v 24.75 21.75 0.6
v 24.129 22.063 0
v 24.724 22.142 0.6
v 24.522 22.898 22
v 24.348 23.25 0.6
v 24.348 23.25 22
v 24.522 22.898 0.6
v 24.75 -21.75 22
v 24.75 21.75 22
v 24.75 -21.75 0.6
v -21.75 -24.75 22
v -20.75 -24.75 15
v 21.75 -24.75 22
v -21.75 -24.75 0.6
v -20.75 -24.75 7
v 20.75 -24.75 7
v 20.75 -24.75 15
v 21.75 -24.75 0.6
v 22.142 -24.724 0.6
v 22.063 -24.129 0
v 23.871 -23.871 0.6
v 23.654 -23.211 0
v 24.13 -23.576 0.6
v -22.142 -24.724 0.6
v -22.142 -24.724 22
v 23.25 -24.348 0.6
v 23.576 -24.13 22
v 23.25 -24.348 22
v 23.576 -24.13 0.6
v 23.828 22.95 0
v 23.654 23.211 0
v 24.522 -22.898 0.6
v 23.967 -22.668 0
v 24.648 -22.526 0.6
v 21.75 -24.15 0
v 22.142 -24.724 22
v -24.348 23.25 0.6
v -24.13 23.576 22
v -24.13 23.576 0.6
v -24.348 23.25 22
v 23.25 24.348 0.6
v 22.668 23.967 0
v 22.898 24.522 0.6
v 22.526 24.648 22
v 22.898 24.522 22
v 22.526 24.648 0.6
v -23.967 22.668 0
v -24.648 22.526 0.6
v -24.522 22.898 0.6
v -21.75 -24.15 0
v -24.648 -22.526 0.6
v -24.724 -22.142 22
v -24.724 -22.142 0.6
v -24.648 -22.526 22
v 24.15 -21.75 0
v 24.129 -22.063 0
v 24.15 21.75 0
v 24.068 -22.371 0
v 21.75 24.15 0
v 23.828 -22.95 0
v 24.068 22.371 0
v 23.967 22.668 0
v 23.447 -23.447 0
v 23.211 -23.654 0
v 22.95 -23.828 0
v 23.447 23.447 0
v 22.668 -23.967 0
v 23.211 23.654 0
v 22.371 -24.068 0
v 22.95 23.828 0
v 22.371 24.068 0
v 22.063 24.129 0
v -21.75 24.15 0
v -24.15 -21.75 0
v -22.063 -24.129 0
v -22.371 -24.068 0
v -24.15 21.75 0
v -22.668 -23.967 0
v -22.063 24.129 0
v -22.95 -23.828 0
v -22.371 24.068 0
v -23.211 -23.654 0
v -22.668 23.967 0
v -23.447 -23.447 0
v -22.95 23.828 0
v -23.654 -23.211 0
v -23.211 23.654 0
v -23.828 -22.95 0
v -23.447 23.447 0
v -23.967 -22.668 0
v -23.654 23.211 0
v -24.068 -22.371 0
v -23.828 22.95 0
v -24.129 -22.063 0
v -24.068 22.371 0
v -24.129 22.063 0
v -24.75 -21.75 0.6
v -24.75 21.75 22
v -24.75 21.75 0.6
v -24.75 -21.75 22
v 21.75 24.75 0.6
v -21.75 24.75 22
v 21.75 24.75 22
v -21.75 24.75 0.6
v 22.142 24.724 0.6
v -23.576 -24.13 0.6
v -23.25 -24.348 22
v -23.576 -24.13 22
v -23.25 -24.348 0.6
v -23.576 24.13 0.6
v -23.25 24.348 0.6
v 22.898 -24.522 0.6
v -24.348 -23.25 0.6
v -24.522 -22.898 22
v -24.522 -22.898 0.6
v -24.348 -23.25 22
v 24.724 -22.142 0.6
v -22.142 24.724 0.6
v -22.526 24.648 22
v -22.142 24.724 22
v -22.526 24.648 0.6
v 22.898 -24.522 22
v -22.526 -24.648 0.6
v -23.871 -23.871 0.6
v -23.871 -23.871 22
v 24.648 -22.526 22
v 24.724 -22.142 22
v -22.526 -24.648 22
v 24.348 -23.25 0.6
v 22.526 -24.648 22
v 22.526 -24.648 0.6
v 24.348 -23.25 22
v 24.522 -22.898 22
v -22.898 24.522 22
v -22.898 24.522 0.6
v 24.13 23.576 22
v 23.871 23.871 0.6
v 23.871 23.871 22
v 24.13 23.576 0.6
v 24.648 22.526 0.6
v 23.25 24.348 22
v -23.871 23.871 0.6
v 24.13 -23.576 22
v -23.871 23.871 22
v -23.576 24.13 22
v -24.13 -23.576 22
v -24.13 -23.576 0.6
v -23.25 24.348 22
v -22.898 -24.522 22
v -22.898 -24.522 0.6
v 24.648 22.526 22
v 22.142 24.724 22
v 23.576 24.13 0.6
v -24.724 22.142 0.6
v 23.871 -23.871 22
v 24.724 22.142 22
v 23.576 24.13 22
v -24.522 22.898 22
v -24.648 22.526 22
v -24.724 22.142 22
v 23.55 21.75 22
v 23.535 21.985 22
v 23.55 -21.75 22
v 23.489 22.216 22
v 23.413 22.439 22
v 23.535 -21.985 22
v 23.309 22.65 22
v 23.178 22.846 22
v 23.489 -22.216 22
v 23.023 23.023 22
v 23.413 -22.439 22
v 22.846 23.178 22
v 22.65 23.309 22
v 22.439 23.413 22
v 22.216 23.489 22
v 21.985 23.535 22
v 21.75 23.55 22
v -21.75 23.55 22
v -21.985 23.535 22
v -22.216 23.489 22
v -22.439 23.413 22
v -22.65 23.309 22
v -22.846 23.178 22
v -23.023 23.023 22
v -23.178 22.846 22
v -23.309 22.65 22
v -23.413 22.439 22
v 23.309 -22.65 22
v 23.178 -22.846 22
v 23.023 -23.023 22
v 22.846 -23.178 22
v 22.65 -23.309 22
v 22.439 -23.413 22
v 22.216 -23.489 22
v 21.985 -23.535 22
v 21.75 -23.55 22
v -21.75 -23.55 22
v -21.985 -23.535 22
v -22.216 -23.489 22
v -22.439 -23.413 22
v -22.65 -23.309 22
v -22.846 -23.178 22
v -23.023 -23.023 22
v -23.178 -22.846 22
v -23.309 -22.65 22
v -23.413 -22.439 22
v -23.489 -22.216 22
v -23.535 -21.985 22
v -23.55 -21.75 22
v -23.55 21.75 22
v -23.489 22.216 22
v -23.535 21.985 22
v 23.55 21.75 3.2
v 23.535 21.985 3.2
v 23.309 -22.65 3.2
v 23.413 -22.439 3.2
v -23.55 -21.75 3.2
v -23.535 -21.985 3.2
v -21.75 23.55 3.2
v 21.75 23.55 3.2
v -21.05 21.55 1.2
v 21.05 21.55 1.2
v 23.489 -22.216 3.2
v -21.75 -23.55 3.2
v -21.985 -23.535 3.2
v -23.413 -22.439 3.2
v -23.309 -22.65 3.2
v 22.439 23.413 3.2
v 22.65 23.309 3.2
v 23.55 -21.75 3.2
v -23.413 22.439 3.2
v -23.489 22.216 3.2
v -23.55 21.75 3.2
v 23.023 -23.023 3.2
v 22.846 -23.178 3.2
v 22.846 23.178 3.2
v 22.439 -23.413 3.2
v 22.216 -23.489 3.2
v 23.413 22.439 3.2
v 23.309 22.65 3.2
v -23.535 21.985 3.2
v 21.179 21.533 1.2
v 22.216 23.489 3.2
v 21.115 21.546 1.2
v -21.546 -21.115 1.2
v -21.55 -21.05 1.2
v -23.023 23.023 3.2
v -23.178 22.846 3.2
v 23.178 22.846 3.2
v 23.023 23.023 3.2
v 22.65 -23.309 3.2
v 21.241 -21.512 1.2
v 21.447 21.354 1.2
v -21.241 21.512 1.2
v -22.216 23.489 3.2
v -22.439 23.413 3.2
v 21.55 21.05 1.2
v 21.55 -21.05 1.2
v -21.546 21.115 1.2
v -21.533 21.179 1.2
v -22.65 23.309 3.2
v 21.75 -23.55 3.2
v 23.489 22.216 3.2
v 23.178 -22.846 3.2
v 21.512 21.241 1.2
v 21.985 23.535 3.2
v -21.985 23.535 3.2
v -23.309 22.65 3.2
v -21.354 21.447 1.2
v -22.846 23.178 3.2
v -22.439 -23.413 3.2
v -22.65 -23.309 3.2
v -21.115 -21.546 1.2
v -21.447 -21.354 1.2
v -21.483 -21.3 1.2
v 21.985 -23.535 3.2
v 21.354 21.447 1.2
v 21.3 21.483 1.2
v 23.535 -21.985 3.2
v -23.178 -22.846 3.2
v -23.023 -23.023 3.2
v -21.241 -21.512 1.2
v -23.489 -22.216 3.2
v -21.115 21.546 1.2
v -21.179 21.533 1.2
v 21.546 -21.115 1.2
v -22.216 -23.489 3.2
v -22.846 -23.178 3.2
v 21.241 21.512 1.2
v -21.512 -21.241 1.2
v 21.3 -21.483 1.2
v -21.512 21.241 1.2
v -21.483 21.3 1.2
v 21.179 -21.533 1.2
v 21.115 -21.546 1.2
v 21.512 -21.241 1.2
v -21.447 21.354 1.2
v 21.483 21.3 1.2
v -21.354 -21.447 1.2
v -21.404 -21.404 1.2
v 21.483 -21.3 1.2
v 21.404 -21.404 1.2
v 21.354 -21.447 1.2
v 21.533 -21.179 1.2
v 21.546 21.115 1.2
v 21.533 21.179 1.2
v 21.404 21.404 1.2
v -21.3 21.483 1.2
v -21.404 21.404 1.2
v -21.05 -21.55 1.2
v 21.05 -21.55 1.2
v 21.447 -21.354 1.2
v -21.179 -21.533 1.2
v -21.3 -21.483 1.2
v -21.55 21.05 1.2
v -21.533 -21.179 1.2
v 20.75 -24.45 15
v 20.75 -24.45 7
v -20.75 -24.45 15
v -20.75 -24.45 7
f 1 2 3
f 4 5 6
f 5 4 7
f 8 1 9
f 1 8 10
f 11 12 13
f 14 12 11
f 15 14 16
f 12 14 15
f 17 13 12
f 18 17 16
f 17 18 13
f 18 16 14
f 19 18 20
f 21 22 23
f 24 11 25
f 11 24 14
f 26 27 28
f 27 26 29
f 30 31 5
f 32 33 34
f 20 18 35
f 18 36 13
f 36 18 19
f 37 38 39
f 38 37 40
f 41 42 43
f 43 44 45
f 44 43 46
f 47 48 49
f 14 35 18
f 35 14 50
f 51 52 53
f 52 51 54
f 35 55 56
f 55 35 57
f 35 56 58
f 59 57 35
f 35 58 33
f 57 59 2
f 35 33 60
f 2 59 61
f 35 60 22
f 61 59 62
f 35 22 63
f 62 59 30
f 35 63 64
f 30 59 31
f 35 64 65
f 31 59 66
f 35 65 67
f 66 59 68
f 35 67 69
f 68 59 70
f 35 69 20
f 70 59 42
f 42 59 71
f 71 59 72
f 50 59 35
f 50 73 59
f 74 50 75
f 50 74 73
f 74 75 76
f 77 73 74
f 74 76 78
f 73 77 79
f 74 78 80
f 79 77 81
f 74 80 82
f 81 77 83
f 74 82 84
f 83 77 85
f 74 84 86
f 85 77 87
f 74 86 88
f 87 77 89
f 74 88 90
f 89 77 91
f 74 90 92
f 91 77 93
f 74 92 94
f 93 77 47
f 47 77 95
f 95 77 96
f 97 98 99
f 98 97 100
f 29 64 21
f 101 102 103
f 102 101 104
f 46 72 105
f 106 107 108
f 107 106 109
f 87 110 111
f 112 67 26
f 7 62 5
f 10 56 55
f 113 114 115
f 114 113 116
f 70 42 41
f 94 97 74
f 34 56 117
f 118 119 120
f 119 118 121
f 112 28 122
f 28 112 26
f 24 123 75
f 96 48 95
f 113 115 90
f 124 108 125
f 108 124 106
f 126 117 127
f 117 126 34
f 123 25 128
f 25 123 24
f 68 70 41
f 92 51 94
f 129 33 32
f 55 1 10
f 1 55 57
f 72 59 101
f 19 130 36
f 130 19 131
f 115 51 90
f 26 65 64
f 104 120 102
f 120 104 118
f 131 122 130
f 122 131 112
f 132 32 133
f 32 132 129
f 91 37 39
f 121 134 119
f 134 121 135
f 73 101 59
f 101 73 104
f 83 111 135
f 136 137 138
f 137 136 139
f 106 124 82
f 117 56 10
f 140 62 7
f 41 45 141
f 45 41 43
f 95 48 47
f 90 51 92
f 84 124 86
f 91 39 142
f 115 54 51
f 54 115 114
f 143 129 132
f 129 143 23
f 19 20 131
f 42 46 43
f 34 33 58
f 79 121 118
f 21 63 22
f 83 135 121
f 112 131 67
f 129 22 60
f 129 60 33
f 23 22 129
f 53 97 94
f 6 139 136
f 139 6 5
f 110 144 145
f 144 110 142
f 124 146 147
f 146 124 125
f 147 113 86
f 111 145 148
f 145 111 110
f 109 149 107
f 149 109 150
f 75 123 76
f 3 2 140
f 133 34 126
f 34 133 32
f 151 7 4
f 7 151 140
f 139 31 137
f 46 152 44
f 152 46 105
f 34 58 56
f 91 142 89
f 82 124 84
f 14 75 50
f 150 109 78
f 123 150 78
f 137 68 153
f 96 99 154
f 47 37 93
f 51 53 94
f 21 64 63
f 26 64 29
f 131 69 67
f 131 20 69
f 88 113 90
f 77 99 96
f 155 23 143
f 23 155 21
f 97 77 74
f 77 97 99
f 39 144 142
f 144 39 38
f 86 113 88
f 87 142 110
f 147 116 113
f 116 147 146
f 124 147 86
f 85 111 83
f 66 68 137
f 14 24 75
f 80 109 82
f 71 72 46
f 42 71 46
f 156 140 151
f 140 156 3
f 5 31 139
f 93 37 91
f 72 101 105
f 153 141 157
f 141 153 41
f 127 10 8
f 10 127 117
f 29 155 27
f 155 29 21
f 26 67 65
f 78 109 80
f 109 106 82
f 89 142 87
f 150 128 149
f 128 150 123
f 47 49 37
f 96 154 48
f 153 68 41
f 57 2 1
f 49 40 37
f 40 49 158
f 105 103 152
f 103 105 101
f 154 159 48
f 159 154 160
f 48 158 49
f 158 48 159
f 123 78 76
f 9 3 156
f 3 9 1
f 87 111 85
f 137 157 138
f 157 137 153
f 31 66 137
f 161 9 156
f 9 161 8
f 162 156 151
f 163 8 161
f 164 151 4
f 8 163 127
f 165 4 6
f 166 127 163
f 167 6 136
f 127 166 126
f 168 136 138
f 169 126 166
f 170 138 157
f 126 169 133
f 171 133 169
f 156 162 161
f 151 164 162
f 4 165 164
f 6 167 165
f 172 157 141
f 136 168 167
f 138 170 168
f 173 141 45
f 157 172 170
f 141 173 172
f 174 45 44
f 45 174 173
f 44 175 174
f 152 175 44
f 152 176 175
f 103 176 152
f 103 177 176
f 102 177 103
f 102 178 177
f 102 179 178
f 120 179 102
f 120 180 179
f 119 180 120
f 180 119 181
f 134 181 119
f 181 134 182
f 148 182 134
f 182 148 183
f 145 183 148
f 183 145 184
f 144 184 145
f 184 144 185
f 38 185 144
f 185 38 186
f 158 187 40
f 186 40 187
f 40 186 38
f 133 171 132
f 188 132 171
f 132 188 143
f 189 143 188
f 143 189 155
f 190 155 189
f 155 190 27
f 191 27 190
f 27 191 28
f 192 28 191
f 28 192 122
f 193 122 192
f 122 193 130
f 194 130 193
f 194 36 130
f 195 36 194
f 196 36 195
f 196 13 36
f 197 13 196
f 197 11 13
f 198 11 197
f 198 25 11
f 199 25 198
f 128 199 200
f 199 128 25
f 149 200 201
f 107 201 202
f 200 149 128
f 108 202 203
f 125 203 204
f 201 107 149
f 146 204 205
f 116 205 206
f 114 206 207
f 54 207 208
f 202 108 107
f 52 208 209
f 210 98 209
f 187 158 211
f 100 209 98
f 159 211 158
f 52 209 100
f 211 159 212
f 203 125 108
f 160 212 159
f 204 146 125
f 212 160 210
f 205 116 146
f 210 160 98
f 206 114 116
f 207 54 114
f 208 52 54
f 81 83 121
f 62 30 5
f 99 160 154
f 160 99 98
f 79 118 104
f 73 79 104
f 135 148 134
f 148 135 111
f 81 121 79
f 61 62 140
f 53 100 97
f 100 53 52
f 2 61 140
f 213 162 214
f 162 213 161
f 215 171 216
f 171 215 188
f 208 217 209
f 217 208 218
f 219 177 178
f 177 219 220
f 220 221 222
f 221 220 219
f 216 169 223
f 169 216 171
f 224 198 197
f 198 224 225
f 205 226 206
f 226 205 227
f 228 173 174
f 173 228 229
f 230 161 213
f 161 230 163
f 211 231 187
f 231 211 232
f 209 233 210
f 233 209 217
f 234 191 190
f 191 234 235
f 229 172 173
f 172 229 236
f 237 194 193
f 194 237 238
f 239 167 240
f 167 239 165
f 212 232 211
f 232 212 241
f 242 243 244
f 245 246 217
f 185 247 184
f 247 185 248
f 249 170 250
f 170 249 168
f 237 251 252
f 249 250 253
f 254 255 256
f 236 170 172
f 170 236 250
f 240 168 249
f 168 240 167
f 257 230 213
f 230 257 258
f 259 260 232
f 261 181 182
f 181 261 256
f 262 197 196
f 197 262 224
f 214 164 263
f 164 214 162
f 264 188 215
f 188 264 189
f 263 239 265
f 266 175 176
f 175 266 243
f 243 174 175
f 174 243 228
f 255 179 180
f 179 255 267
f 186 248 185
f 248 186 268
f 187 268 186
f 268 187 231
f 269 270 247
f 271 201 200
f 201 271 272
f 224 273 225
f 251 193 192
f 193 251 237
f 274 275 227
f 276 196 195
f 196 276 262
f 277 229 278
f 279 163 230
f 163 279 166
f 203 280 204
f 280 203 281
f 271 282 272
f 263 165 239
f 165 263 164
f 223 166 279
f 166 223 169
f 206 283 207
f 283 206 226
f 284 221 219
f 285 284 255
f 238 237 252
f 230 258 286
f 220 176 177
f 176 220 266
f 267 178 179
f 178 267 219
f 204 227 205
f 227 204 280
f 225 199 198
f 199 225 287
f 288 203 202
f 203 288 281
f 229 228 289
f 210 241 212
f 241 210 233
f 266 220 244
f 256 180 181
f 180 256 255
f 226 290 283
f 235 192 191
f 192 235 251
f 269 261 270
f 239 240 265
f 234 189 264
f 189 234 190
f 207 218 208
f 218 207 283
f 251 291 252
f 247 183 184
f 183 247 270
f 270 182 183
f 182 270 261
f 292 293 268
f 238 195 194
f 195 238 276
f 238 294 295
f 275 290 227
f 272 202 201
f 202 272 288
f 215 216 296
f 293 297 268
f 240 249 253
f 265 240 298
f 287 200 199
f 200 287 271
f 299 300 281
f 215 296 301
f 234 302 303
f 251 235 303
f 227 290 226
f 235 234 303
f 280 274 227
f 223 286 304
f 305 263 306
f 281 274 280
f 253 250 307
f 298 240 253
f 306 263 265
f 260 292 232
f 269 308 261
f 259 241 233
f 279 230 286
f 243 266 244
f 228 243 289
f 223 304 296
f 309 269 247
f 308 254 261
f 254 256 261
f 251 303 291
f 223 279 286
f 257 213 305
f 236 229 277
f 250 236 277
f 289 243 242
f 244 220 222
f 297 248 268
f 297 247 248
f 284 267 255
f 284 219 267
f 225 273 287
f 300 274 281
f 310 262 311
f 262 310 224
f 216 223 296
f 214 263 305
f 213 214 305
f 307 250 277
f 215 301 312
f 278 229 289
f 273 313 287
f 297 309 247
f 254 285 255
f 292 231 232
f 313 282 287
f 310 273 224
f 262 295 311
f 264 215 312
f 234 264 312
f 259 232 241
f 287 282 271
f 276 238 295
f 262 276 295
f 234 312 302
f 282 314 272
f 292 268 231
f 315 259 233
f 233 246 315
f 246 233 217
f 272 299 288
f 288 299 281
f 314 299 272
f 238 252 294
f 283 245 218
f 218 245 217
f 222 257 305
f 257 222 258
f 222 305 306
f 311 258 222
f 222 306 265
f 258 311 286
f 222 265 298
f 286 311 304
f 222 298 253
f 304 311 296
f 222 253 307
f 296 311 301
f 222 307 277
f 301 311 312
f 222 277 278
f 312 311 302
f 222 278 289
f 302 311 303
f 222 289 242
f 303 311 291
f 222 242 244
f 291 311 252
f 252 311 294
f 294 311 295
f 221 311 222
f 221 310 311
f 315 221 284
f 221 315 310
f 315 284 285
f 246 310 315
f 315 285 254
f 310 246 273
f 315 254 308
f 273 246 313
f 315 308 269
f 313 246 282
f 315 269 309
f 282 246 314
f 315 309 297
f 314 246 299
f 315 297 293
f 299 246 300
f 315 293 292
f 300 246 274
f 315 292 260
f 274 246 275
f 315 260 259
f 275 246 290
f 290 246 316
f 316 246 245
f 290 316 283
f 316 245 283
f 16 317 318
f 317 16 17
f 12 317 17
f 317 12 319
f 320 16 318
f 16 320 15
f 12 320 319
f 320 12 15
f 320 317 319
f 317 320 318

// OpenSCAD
// Scatoline aperte (senza coperchio) per minerali - parametrico
// Materiale: PETG-CF  |  Unità: mm
// Le misure esterne seguono una griglia di 25 mm (meno il gioco) così
// scatole di formati diversi si affiancano senza spazi in un cassetto.

/* [Formato] */
celle_x   = 2;     // numero di celle da 25 mm in X
celle_y   = 2;     // numero di celle da 25 mm in Y
altezza   = 22;    // altezza esterna totale
griglia   = 25;    // passo della griglia
gioco     = 0.5;   // gioco totale tra scatole affiancate

/* [Pareti] */
parete    = 1.2;   // spessore parete (2 linee con ugello 0.6, 3 con 0.4)
fondo     = 1.2;   // spessore fondo
r_est     = 3;     // raggio angoli esterni (verticali)
raccordo  = 2;     // smusso 45° interno fondo/parete (facilita la presa)
smusso_base = 0.6; // smusso esterno sul bordo inferiore (anti elephant-foot)

/* [Etichetta] */
etichetta = true;  // incavo frontale per etichetta adesiva
etich_h   = 8;     // altezza incavo
etich_prof= 0.3;   // profondità incavo

$fn = 48;

L = celle_x*griglia - gioco;
W = celle_y*griglia - gioco;

module rrect(l, w, r, h) {
  r2 = max(min(r, l/2-0.01, w/2-0.01), 0.01);
  linear_extrude(h) offset(r=r2) square([l-2*r2, w-2*r2], center=true);
}

module esterno() {
  hull() {
    rrect(L-2*smusso_base, W-2*smusso_base, r_est-smusso_base, 0.01);
    translate([0,0,smusso_base]) rrect(L, W, r_est, altezza-smusso_base);
  }
}

module cavita() {
  li = L-2*parete; wi = W-2*parete; ri = max(r_est-parete, 0.5);
  hull() {
    translate([0,0,fondo]) rrect(li-2*raccordo, wi-2*raccordo, max(ri-raccordo,0.5), 0.01);
    translate([0,0,fondo+raccordo]) rrect(li, wi, ri, altezza);
  }
}

module incavo_etichetta() {
  lw = L - 2*r_est - 2;
  translate([-lw/2, -W/2-1, (altezza-etich_h)/2])
    cube([lw, 1+etich_prof, etich_h]);
}

difference() {
  esterno();
  cavita();
  if (etichetta && altezza >= etich_h + 6) incavo_etichetta();
}
